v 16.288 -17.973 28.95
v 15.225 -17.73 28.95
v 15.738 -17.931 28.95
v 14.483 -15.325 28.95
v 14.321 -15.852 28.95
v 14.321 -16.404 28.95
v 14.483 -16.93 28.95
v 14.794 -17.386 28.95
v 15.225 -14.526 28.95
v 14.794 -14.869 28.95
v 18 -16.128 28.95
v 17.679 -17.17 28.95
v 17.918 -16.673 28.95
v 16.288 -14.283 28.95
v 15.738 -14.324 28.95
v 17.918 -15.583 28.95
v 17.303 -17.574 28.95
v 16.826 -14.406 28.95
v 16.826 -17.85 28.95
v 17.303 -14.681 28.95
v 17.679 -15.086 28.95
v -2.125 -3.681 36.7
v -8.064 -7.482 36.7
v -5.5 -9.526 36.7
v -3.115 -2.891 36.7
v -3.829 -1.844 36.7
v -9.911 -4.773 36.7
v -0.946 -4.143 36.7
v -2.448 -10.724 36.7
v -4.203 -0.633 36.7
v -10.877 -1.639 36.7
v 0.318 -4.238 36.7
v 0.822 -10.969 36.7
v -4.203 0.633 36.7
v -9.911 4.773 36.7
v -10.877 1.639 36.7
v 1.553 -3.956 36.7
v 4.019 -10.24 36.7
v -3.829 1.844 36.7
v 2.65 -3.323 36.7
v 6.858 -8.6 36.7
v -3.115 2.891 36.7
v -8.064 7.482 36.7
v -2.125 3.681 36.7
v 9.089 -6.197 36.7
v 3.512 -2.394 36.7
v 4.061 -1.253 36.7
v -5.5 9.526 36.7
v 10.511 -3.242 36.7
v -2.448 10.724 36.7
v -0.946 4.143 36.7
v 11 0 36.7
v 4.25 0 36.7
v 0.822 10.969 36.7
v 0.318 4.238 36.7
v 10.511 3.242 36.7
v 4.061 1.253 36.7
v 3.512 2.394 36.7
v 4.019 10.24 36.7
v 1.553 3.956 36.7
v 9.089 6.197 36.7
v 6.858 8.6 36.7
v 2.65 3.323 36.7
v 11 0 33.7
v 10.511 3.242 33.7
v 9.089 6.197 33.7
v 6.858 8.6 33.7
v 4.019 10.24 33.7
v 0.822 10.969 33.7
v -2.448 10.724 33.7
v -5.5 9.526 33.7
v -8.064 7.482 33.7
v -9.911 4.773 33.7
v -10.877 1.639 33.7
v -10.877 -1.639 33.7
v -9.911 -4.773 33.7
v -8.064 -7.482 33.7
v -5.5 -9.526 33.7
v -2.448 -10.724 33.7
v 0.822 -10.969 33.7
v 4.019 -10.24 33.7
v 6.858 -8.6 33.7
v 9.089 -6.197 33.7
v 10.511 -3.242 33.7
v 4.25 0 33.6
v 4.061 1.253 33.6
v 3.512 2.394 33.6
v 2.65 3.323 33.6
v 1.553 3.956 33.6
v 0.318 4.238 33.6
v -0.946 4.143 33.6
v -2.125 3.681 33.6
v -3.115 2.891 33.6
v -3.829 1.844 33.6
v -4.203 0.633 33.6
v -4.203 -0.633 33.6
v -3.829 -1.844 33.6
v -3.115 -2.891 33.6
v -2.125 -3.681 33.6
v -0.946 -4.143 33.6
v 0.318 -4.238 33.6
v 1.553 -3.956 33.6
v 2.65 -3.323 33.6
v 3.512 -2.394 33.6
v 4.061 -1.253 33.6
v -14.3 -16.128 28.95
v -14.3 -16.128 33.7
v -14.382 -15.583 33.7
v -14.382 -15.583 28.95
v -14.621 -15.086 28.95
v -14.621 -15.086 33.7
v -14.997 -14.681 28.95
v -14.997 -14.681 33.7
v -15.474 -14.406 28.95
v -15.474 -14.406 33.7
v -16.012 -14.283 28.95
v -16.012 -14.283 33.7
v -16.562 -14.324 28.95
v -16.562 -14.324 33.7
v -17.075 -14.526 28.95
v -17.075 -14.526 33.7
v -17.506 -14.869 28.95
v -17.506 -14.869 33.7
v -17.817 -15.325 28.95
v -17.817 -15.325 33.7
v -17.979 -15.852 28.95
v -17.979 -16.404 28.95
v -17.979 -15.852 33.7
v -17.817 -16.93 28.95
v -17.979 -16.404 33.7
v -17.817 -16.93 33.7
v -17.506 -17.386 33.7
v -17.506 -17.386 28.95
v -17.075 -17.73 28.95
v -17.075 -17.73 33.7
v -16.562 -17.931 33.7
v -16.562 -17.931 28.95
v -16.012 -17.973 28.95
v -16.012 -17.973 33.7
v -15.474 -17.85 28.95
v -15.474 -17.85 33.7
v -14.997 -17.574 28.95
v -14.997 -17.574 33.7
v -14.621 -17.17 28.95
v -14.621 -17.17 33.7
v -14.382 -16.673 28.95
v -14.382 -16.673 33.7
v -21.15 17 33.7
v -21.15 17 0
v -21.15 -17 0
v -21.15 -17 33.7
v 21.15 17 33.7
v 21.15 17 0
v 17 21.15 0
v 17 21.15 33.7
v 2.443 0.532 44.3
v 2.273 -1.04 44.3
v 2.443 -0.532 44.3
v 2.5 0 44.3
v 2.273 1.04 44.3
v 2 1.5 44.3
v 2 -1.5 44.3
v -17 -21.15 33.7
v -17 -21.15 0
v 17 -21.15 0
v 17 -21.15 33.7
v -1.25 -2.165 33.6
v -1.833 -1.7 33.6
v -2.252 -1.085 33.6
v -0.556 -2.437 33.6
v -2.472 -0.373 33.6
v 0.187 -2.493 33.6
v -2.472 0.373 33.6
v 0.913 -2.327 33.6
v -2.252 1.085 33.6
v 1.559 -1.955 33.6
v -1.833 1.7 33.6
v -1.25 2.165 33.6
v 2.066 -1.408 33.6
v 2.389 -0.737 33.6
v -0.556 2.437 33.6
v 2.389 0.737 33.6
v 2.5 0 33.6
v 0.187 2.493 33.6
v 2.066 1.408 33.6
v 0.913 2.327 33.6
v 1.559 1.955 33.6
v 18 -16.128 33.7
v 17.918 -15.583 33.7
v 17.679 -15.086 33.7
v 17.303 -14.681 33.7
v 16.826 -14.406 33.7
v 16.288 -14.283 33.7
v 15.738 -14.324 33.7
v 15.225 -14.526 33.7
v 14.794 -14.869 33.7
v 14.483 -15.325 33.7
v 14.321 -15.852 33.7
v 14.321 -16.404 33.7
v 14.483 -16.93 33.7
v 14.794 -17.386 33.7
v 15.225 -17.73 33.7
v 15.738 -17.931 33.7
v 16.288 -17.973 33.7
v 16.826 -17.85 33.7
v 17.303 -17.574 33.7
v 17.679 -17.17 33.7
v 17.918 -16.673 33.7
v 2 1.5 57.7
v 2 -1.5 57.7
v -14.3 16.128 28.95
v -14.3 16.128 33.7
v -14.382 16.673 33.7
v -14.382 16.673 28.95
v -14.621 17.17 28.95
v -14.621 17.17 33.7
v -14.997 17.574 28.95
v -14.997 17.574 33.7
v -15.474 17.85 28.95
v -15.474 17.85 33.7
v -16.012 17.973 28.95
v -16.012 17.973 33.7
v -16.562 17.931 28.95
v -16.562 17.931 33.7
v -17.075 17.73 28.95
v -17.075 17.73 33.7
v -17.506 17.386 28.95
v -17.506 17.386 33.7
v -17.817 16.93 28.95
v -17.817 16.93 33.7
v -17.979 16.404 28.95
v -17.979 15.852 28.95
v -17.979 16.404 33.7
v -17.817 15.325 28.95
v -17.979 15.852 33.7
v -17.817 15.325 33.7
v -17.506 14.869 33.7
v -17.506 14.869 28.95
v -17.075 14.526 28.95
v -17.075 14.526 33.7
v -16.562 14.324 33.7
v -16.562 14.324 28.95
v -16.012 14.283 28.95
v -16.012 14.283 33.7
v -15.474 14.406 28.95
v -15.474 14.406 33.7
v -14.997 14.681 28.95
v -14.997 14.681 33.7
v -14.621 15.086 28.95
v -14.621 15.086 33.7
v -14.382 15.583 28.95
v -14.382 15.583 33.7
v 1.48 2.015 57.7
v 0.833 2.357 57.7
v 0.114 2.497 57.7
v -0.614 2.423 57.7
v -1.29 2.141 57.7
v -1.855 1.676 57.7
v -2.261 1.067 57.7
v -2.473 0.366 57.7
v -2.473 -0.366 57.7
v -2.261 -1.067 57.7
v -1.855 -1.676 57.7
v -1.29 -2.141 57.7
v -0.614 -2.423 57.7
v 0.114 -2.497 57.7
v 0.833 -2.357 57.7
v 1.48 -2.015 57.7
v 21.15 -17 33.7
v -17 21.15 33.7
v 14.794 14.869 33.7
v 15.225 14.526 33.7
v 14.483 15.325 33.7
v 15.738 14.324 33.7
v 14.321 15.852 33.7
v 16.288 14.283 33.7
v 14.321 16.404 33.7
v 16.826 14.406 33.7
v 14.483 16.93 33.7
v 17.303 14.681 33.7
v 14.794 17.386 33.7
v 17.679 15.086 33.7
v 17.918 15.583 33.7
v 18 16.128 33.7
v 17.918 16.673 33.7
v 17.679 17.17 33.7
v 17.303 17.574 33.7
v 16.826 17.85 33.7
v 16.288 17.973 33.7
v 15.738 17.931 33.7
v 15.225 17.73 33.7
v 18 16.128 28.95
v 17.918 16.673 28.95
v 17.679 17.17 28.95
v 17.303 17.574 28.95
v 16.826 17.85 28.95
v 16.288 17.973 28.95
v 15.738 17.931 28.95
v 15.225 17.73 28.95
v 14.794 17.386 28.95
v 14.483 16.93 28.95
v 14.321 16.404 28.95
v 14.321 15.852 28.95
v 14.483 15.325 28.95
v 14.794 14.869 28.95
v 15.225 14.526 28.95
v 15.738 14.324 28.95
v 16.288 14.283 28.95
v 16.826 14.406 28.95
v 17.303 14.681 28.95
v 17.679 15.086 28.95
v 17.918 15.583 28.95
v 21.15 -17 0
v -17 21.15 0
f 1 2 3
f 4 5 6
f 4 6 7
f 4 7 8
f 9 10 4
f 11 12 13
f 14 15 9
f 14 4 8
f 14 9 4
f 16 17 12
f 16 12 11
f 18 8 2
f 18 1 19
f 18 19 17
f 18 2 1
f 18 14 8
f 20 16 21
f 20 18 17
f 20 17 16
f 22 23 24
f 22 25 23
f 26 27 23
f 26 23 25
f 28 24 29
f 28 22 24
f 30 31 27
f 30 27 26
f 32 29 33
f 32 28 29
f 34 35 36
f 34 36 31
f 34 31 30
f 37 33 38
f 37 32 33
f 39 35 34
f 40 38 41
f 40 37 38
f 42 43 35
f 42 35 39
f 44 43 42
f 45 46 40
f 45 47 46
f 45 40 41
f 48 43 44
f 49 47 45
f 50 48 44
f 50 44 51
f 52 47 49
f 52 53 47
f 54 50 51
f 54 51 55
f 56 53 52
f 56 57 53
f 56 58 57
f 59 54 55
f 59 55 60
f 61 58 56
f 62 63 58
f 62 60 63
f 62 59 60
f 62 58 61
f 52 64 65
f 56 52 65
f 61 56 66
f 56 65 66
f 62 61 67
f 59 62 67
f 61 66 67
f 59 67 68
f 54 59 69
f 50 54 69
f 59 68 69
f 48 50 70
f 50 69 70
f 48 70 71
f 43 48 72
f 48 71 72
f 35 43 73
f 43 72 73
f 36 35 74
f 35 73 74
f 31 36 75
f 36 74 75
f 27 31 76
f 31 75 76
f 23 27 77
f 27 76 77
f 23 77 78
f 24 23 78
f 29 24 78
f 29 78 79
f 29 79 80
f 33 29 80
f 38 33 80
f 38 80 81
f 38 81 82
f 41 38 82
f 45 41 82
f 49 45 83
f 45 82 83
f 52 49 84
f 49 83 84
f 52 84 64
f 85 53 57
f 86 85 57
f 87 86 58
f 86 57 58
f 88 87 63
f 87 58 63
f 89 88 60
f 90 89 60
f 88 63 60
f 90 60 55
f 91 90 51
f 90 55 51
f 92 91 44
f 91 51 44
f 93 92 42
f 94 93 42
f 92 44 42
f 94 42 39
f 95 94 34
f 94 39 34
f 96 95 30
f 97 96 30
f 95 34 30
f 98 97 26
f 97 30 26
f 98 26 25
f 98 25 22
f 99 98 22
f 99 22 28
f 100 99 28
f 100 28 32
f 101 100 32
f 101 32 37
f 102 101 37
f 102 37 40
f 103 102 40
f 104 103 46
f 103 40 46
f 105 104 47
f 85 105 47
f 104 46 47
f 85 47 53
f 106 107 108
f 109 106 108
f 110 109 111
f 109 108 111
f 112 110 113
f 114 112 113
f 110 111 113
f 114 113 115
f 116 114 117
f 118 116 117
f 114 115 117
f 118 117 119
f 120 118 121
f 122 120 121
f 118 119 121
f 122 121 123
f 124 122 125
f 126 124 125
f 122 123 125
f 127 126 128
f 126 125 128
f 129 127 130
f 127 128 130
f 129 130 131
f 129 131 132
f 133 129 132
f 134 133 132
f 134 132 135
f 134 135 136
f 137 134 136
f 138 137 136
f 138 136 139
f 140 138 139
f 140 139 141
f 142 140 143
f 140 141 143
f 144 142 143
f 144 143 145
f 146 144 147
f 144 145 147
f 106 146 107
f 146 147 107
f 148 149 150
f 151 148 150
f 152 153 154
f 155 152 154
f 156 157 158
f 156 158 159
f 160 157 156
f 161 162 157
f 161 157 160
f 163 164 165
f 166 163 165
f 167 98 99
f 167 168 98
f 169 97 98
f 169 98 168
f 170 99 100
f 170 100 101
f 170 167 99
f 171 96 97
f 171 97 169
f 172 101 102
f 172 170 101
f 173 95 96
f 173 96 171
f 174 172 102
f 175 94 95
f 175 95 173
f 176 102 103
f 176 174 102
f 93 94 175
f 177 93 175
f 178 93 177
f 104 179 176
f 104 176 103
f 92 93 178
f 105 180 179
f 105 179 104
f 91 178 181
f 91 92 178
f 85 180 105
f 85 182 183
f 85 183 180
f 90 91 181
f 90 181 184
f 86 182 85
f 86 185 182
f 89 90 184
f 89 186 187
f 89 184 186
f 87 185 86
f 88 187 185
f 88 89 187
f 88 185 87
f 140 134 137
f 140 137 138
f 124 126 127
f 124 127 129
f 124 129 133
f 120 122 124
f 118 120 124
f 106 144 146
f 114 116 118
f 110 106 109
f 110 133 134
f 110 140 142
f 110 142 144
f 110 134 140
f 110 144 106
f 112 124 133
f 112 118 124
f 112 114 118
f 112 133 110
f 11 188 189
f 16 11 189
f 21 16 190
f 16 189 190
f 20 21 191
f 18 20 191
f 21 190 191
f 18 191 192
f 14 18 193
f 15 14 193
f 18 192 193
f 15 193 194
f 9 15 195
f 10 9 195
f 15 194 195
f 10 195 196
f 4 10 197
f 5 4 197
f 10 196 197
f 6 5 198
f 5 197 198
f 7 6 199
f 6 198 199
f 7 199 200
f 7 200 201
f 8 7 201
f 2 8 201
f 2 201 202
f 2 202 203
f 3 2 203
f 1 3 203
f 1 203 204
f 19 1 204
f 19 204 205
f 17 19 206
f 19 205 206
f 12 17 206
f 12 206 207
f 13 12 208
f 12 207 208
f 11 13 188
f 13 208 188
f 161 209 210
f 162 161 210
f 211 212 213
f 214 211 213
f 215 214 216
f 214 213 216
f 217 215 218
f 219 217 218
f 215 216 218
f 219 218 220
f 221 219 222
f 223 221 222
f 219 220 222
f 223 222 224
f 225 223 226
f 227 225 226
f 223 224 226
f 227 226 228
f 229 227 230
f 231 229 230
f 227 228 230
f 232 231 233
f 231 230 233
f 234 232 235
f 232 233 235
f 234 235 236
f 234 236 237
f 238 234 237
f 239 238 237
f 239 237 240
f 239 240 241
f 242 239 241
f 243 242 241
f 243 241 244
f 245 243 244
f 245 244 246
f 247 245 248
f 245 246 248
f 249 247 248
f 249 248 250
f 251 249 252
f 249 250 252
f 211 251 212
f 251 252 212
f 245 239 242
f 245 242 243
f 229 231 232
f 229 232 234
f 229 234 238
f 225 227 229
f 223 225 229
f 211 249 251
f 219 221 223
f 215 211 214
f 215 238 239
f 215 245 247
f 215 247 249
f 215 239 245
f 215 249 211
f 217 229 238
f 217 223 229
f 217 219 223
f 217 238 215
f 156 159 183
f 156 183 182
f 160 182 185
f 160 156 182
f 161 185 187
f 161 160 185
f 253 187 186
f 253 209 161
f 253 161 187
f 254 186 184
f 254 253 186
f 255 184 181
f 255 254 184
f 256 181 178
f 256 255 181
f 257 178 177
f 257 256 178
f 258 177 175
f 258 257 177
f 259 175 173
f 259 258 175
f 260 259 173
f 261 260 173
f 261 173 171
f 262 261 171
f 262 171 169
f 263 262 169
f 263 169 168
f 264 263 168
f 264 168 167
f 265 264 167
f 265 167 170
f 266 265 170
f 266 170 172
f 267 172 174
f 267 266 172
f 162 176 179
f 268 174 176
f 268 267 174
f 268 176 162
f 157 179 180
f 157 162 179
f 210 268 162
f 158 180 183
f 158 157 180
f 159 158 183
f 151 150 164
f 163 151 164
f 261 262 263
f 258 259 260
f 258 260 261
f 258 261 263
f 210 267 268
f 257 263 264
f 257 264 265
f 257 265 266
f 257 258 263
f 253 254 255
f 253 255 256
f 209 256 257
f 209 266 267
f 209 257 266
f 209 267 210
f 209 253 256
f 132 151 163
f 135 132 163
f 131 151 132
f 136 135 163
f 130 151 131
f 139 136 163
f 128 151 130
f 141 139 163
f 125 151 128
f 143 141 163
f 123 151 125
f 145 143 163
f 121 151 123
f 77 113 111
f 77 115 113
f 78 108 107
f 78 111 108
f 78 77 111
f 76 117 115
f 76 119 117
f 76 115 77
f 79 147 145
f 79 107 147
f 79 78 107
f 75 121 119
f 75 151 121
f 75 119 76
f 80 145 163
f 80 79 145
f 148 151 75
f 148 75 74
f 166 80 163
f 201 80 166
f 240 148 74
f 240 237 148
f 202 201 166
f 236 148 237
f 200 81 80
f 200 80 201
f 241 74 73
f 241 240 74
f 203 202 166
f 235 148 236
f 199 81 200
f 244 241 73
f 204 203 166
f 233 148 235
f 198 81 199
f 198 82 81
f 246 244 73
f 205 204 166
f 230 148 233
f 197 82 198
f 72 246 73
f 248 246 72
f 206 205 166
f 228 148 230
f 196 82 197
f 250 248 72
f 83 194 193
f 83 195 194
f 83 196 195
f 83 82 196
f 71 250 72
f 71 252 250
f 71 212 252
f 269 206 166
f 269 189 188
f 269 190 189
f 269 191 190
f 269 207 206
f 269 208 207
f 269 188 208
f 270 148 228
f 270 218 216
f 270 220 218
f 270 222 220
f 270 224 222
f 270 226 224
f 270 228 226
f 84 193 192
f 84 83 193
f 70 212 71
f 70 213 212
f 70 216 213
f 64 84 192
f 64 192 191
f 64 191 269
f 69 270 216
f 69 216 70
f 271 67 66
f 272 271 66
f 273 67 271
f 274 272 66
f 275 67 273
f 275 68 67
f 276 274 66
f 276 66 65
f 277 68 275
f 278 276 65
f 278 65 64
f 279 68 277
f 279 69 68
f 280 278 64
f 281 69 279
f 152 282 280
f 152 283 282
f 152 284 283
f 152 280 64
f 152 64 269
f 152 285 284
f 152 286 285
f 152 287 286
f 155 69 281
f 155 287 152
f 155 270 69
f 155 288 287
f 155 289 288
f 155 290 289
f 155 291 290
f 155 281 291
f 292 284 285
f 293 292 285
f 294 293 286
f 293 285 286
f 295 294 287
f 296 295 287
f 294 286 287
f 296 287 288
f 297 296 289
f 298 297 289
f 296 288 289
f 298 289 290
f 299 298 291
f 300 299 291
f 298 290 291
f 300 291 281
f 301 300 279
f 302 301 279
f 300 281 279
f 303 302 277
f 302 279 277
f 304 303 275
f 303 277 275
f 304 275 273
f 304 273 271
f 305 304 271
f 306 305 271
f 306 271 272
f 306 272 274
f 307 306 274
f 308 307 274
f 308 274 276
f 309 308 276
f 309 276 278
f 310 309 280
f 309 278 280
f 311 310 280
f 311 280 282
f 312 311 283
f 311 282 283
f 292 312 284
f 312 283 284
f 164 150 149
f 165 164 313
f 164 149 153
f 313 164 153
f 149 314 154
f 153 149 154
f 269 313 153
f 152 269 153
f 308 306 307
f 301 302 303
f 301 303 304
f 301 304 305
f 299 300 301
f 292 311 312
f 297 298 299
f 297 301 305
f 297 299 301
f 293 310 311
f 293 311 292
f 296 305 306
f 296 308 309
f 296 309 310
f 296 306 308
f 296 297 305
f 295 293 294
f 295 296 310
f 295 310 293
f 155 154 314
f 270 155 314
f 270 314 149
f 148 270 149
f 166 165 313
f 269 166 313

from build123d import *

# Parameters (mm, degrees)
F2_DEPTH      = 33.7
F3_R          = 11
F4_DEPTH      = 3
F5_R          = 4.25
F5_R_2        = 2.5
F6_DEPTH      = 3.1
F7_DEPTH      = 21
F7_DEPTH_BACK = 25.4
F9_DEPTH      = 13.4
F10_R         = 1.85
F11_DEPTH     = 4.75


with BuildPart() as f2:
    # F1 (on face) → F2 (new body)
    with BuildSketch(Plane.XY):
        Polygon((8.1, -21.15), (8.1, -18.0250372231), (-8.1, -18.0250372231), (-8.1, -21.15), (0, -21.15), align=None)
        Polygon((-8.1, -18.0250372231), (8.1, -18.0250372231), (8.1, -21.15), (17, -21.15), (21.15, -17), (21.15, 0), (21.15, 17), (17, 21.15), (0, 21.15), (-17, 21.15), (-21.15, 17), (-21.15, 0), (-21.15, -17), (-17, -21.15), (-8.1, -21.15), align=None)
    extrude(amount=F2_DEPTH)

    # F3 (on face) → F4 (join)
    with BuildSketch(Plane.XY.offset(33.7)):
        Circle(F3_R)
    extrude(amount=F4_DEPTH)

    # F5 (on face) → F6 (cut)
    with BuildSketch(Plane.XY.offset(36.7)):
        Circle(F5_R)
        Circle(F5_R_2, mode=Mode.SUBTRACT)
        Circle(F5_R_2)
    extrude(amount=-F6_DEPTH, mode=Mode.SUBTRACT)

    # F5 (on face) → F7 (join, two sides)
    with BuildSketch(Plane.XY.offset(36.7)) as f7_sk:
        Circle(F5_R_2)
    extrude(amount=F7_DEPTH)
    extrude(f7_sk.sketch, amount=-F7_DEPTH_BACK)

    # F8 (on face) → F9 (cut)
    with BuildSketch(Plane.XY.offset(57.7)):
        with BuildLine():
            Line((2, 1.5), (2, 0))
            Line((2, 0), (2, -1.5))
            ThreePointArc((2, -1.5), (2.3717082451, -0.790569415), (2.5, 0))
            ThreePointArc((2.5, 0), (2.3717082451, 0.790569415), (2, 1.5))
        make_face()
    extrude(amount=-F9_DEPTH, mode=Mode.SUBTRACT)

    # F10 (on face) → F11 (cut)
    with BuildSketch(Plane.XY.offset(33.7)):
        with Locations((-16.15, 16.1278136075)):
            Circle(F10_R)
        with Locations((16.15, 16.1278136075)):
            Circle(F10_R)
        with Locations((16.15, -16.1278136075)):
            Circle(F10_R)
        with Locations((-16.15, -16.1278136075)):
            Circle(F10_R)
    extrude(amount=-F11_DEPTH, mode=Mode.SUBTRACT)


solid = f2.part
